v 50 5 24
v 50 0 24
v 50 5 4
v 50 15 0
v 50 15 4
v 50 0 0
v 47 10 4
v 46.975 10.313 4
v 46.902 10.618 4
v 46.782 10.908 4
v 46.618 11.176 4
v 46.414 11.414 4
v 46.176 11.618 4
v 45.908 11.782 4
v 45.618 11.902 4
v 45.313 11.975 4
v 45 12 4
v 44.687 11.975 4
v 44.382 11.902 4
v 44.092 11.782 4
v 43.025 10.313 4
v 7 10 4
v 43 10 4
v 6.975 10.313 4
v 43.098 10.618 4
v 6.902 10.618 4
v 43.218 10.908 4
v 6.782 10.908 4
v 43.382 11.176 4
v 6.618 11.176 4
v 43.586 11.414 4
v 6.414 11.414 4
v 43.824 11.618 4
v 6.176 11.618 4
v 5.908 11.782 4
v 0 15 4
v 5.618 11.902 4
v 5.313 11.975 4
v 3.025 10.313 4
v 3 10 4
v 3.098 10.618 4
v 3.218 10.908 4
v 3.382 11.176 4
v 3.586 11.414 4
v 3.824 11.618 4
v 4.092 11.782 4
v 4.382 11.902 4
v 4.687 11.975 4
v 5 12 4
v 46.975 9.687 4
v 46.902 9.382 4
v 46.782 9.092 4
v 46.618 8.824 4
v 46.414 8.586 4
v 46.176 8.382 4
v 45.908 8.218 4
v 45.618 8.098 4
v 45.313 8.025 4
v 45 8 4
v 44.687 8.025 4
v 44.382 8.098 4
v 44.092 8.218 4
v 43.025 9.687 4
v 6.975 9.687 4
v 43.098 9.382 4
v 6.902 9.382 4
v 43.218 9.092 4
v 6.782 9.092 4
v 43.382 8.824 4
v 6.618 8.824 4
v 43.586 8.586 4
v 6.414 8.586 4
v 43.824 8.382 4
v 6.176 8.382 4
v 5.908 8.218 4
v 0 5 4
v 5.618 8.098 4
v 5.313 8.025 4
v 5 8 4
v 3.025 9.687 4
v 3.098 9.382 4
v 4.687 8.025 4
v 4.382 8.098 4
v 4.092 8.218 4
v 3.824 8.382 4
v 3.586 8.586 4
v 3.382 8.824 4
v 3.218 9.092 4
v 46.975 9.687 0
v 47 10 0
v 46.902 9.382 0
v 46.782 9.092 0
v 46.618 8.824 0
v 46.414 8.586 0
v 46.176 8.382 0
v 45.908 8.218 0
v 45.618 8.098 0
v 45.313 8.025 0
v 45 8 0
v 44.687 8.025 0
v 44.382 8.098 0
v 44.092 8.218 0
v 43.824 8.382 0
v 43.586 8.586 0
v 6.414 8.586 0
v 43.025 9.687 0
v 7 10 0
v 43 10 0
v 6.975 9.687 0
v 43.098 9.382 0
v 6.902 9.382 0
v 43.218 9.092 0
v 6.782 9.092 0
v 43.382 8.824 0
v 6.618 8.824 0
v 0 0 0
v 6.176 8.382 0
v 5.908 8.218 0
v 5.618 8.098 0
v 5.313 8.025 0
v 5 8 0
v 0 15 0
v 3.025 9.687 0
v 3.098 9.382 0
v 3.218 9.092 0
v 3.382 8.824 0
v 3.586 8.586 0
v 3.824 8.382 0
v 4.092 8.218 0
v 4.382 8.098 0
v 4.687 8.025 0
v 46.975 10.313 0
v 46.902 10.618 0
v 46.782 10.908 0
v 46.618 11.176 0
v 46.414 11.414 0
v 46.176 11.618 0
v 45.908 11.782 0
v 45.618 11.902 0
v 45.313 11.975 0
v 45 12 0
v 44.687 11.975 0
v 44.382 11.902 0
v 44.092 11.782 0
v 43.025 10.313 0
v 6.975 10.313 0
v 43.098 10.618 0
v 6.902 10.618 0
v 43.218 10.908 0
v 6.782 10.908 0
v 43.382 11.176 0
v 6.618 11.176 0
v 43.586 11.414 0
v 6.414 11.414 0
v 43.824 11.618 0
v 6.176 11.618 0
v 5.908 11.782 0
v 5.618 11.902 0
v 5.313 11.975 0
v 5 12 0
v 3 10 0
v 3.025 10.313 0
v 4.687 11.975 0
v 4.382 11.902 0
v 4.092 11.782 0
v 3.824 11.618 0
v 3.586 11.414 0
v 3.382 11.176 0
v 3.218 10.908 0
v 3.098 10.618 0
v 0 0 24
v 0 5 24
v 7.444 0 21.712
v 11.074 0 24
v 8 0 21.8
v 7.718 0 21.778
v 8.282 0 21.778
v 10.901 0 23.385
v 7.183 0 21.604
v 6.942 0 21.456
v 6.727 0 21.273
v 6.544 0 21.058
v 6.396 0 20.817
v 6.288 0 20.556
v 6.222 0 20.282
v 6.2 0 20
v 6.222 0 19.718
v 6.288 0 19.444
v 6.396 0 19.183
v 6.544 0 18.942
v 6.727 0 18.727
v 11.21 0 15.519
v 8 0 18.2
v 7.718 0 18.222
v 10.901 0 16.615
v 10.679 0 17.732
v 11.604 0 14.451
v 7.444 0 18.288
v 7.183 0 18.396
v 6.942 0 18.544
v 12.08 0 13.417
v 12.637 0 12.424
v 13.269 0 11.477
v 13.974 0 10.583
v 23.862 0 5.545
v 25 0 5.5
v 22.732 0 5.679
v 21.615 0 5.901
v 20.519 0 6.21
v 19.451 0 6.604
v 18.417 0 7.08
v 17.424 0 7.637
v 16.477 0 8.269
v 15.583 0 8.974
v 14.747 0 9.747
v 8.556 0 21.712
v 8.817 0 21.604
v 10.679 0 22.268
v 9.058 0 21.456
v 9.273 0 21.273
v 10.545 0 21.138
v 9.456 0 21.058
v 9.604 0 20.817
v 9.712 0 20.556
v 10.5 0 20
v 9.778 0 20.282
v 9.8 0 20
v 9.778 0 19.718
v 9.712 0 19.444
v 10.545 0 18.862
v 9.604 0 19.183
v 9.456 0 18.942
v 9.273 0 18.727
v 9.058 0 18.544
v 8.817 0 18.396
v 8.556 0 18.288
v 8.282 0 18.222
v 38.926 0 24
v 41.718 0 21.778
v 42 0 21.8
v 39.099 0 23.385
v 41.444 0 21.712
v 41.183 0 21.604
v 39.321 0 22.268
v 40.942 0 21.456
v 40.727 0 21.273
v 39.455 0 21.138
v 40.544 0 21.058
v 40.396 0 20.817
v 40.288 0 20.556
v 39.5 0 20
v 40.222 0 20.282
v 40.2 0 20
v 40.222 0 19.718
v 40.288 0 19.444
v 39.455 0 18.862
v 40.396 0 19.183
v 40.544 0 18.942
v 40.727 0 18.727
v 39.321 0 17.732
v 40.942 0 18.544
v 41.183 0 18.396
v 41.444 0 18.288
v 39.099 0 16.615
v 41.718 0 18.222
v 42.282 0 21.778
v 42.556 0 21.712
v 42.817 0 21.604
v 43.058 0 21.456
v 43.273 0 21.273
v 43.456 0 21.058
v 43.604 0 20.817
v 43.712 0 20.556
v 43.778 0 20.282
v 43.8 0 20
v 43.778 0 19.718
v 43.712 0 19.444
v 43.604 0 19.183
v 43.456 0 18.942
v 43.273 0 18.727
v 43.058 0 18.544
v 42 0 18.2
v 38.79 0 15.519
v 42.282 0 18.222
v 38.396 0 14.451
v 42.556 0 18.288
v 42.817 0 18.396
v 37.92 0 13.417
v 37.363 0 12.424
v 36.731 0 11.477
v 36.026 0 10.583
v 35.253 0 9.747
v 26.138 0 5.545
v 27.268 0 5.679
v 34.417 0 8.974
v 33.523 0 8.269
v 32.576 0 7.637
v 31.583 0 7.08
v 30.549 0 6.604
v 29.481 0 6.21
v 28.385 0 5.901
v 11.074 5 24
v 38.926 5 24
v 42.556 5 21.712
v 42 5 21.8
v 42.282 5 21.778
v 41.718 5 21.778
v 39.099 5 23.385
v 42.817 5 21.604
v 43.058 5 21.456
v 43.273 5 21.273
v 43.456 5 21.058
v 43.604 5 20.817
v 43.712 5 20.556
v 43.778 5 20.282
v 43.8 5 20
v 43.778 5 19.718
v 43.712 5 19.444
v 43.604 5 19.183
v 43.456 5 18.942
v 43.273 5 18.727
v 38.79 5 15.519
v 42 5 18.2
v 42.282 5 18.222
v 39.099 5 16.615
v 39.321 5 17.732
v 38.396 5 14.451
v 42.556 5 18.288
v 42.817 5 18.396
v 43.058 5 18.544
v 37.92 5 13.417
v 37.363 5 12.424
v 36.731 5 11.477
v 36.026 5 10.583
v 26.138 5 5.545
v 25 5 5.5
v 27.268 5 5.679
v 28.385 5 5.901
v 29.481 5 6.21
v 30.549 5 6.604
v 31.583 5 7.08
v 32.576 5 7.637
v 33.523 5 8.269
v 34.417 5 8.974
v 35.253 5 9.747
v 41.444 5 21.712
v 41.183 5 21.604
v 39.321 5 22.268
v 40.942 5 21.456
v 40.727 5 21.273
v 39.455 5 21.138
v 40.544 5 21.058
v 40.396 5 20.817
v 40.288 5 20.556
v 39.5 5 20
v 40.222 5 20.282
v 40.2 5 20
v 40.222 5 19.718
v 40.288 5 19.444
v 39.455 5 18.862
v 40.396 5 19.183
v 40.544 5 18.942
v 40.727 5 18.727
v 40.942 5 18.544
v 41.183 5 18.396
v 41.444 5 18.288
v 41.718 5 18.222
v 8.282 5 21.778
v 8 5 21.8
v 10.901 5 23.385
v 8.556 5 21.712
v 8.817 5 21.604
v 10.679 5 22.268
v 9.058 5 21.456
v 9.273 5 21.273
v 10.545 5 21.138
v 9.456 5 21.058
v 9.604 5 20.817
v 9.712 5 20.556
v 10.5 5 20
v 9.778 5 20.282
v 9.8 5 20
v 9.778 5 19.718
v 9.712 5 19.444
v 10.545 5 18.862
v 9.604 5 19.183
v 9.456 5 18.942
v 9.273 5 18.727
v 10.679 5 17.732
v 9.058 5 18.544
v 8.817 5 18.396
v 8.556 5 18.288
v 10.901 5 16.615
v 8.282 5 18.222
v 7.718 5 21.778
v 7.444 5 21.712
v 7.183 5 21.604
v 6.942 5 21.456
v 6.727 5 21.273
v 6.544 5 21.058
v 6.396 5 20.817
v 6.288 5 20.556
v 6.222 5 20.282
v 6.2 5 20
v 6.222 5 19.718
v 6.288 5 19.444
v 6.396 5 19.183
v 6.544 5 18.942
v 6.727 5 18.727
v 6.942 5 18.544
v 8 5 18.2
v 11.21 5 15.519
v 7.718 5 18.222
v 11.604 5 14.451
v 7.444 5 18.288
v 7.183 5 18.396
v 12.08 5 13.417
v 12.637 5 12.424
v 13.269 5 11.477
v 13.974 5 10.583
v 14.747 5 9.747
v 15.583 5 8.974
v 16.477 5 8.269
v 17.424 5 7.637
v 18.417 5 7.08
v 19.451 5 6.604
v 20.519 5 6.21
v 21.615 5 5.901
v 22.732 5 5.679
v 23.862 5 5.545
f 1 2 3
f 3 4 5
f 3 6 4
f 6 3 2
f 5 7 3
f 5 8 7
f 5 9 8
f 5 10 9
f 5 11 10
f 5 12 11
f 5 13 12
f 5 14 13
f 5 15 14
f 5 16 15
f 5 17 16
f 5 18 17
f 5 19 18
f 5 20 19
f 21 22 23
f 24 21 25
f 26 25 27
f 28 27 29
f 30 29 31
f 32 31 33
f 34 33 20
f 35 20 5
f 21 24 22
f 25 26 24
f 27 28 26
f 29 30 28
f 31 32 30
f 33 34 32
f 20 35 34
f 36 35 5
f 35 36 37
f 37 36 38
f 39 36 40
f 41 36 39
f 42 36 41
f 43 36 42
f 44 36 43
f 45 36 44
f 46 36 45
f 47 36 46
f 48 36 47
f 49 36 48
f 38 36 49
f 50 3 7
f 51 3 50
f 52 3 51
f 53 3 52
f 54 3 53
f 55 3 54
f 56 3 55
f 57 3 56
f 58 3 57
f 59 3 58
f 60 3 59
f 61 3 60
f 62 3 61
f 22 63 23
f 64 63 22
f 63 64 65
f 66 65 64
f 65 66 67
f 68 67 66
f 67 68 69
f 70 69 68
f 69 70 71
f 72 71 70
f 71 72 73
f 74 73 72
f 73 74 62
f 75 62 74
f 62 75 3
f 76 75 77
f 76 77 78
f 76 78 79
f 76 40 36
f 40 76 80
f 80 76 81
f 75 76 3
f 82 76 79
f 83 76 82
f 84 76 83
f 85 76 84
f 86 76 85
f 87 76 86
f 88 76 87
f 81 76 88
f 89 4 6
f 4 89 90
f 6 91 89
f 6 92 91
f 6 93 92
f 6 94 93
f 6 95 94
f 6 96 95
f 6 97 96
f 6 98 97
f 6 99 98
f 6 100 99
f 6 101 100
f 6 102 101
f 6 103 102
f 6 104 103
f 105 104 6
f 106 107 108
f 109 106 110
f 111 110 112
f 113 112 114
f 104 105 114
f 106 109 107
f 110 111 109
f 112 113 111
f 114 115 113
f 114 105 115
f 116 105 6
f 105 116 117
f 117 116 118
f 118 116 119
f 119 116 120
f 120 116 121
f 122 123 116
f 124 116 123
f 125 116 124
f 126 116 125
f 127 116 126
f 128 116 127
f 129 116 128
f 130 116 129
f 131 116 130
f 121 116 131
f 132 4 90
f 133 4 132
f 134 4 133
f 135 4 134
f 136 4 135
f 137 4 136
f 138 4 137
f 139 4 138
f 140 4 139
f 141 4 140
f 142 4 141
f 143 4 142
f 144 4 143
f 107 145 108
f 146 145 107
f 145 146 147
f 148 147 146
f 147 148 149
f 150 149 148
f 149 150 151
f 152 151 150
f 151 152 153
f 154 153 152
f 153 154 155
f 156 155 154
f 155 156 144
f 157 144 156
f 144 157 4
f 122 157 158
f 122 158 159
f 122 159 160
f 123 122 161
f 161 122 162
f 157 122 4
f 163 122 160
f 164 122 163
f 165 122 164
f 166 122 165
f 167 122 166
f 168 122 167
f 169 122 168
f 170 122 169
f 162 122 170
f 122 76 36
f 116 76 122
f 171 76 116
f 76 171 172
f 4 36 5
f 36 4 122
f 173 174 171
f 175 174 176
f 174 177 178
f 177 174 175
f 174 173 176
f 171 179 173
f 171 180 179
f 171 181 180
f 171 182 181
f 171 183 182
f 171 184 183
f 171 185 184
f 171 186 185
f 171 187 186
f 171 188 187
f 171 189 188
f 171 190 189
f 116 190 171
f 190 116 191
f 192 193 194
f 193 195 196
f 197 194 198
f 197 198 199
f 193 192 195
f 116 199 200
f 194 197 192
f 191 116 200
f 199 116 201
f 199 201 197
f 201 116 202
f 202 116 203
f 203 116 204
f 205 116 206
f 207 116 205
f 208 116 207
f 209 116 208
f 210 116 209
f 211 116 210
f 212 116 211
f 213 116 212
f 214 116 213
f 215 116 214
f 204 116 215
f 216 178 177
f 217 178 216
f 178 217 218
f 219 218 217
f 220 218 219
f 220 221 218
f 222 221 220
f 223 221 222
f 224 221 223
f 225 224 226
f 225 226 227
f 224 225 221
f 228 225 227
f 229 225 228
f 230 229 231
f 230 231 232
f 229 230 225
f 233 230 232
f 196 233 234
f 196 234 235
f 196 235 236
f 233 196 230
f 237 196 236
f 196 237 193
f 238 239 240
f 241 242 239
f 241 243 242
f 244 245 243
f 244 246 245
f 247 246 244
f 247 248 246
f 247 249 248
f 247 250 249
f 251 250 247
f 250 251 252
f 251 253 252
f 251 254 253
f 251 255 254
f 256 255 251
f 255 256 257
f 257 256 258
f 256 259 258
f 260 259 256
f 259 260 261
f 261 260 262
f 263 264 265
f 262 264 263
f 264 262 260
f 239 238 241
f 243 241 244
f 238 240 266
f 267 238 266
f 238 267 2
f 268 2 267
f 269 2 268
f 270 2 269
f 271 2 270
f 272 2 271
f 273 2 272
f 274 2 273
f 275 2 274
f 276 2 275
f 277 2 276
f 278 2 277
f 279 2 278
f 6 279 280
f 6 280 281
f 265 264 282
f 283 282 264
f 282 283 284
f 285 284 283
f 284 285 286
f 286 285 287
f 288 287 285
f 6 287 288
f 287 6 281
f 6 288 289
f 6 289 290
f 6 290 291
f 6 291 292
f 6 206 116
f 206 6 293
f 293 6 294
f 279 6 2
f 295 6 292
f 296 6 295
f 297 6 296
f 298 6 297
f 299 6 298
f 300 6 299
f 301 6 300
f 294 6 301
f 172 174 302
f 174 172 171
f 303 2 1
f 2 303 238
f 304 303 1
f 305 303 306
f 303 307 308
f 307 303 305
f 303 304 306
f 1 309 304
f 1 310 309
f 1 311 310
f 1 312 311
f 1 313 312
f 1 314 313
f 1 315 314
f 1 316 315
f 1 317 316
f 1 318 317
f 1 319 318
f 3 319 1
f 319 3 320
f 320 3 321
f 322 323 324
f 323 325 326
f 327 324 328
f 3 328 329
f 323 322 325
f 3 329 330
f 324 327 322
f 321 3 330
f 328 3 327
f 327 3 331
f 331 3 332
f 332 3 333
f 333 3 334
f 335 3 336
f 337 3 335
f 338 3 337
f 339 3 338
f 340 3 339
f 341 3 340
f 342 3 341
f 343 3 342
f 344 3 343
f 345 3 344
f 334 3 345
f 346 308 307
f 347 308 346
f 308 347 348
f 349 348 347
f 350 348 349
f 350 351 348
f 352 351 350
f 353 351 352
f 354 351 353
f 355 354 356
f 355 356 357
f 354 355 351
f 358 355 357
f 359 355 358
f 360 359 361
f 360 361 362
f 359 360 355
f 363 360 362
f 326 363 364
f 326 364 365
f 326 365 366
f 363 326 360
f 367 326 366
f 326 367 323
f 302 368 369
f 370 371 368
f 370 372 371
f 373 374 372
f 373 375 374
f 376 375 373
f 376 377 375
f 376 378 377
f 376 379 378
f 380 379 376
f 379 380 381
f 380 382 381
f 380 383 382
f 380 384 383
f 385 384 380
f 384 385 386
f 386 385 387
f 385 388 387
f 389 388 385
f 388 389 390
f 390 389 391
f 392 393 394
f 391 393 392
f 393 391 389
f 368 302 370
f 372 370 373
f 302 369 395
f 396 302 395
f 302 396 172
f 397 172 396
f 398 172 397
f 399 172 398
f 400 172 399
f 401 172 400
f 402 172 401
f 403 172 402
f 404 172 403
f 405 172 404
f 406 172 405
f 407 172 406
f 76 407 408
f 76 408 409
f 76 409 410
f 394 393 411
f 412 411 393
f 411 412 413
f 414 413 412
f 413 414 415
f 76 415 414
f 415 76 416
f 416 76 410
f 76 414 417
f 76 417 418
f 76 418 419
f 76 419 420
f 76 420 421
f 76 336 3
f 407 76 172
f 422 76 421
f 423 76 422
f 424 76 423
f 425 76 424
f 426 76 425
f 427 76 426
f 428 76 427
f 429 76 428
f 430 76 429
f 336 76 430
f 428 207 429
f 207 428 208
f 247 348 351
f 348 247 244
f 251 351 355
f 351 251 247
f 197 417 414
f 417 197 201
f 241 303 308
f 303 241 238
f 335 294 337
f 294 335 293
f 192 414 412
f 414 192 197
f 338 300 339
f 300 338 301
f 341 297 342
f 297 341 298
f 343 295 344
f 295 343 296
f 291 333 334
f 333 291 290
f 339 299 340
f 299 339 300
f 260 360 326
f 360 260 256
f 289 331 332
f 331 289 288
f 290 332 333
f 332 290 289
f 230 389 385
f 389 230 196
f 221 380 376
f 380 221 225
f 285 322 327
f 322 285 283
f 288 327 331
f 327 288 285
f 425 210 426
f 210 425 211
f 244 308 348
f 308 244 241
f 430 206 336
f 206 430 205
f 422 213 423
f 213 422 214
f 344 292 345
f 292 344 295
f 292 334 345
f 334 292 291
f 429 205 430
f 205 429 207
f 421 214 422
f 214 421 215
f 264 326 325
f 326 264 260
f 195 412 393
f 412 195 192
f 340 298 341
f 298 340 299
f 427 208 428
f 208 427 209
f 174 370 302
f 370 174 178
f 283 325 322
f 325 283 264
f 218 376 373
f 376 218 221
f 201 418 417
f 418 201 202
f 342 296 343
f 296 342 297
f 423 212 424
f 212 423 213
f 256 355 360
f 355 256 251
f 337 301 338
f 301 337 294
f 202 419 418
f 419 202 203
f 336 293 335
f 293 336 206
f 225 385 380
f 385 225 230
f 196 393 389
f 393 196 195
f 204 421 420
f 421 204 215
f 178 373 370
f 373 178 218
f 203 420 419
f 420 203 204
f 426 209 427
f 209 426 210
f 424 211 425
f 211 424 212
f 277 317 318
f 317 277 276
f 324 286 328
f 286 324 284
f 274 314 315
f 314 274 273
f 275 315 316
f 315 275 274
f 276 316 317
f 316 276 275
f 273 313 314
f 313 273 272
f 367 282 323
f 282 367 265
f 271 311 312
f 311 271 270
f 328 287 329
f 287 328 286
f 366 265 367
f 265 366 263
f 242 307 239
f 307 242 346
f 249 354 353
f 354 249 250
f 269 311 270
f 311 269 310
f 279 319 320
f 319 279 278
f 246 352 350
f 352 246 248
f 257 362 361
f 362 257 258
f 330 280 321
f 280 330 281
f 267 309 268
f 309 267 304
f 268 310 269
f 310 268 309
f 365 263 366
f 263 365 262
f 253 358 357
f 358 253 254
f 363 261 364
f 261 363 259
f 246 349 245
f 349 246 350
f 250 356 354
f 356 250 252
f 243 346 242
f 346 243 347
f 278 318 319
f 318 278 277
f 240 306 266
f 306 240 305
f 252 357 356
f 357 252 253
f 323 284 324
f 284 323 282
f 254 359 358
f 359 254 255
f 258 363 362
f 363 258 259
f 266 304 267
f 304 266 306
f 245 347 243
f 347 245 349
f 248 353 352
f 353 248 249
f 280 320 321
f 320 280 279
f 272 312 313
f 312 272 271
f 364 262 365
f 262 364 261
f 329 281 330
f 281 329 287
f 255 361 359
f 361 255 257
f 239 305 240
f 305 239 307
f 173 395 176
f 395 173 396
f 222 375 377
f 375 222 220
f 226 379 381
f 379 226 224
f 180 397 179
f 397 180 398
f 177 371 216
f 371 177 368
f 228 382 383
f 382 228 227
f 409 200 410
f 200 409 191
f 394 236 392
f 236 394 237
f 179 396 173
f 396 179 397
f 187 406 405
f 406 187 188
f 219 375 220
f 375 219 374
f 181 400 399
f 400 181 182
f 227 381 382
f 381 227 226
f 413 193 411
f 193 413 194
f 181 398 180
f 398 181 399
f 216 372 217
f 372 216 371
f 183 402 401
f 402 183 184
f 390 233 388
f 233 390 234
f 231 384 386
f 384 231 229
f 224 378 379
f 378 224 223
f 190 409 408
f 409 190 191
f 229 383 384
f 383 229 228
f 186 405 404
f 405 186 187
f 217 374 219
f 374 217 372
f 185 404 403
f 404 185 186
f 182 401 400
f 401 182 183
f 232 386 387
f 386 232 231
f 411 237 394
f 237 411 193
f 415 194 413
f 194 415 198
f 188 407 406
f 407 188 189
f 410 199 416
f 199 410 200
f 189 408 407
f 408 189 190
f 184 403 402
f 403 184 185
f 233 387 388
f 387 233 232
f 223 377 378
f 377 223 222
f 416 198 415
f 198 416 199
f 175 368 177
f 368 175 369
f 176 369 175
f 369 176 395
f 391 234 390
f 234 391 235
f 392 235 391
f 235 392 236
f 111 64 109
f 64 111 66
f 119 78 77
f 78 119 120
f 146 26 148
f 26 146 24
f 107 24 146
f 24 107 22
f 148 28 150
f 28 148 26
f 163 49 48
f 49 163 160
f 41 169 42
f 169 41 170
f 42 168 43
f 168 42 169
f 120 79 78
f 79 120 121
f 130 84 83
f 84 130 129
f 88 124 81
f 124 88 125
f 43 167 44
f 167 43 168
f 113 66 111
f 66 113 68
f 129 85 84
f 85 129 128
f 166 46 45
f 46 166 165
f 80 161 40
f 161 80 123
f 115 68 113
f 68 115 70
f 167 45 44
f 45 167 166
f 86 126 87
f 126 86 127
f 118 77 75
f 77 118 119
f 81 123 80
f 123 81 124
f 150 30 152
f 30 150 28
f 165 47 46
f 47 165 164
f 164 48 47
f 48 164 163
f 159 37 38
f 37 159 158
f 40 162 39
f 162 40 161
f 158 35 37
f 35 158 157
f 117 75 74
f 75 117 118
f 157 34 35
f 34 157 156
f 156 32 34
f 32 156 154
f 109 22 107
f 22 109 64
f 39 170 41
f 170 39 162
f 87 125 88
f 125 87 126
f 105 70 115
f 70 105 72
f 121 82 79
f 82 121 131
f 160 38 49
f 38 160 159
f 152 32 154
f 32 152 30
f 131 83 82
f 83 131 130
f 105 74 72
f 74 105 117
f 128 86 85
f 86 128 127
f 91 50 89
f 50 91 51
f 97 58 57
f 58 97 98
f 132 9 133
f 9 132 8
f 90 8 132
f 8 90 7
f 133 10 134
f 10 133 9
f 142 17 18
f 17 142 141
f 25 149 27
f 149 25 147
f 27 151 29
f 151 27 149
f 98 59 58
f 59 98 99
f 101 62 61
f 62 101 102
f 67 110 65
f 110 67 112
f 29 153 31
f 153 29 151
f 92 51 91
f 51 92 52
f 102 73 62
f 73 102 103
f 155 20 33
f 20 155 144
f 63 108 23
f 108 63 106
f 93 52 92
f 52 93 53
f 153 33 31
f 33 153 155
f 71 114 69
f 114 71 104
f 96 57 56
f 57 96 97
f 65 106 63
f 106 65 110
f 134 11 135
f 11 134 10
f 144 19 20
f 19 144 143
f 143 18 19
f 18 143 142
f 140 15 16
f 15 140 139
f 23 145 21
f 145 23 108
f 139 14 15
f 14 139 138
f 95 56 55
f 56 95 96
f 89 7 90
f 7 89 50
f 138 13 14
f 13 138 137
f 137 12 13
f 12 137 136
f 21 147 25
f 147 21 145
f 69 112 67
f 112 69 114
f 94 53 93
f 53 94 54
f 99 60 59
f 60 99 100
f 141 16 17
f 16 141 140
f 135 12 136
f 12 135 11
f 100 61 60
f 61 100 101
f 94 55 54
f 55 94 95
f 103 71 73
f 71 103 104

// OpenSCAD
difference(){
	union(){
        translate([0,0,0]){
          cube([50,15,4], center=false);
        }			   
        translate([0,0,0]){
          cube([50,5,24], center=false);
        }			   
	}
    {
        union() {           
            translate([25,10,20]){
                rotate(a = [90,0,0]) {
                    cylinder(h=40, r=14.5, $fn=80, center=false);     
                }
            }			   
            translate([42,10,20]){
                rotate(a = [90,0,0]) {
                    cylinder(h=40, r=1.8, $fn=40, center=false);     
                }
            }			   
            translate([8,10,20]){
                rotate(a = [90,0,0]) {
                    cylinder(h=40, r=1.8, $fn=40, center=false);     
                }
            }			   
            
            translate([5,10,-1]){
                cylinder(h=40, r=2, $fn=40, center=false);     
            }			   
            translate([45,10,-1]){
                cylinder(h=40, r=2, $fn=40, center=false);     
            }			   
            
        }
    }
}
